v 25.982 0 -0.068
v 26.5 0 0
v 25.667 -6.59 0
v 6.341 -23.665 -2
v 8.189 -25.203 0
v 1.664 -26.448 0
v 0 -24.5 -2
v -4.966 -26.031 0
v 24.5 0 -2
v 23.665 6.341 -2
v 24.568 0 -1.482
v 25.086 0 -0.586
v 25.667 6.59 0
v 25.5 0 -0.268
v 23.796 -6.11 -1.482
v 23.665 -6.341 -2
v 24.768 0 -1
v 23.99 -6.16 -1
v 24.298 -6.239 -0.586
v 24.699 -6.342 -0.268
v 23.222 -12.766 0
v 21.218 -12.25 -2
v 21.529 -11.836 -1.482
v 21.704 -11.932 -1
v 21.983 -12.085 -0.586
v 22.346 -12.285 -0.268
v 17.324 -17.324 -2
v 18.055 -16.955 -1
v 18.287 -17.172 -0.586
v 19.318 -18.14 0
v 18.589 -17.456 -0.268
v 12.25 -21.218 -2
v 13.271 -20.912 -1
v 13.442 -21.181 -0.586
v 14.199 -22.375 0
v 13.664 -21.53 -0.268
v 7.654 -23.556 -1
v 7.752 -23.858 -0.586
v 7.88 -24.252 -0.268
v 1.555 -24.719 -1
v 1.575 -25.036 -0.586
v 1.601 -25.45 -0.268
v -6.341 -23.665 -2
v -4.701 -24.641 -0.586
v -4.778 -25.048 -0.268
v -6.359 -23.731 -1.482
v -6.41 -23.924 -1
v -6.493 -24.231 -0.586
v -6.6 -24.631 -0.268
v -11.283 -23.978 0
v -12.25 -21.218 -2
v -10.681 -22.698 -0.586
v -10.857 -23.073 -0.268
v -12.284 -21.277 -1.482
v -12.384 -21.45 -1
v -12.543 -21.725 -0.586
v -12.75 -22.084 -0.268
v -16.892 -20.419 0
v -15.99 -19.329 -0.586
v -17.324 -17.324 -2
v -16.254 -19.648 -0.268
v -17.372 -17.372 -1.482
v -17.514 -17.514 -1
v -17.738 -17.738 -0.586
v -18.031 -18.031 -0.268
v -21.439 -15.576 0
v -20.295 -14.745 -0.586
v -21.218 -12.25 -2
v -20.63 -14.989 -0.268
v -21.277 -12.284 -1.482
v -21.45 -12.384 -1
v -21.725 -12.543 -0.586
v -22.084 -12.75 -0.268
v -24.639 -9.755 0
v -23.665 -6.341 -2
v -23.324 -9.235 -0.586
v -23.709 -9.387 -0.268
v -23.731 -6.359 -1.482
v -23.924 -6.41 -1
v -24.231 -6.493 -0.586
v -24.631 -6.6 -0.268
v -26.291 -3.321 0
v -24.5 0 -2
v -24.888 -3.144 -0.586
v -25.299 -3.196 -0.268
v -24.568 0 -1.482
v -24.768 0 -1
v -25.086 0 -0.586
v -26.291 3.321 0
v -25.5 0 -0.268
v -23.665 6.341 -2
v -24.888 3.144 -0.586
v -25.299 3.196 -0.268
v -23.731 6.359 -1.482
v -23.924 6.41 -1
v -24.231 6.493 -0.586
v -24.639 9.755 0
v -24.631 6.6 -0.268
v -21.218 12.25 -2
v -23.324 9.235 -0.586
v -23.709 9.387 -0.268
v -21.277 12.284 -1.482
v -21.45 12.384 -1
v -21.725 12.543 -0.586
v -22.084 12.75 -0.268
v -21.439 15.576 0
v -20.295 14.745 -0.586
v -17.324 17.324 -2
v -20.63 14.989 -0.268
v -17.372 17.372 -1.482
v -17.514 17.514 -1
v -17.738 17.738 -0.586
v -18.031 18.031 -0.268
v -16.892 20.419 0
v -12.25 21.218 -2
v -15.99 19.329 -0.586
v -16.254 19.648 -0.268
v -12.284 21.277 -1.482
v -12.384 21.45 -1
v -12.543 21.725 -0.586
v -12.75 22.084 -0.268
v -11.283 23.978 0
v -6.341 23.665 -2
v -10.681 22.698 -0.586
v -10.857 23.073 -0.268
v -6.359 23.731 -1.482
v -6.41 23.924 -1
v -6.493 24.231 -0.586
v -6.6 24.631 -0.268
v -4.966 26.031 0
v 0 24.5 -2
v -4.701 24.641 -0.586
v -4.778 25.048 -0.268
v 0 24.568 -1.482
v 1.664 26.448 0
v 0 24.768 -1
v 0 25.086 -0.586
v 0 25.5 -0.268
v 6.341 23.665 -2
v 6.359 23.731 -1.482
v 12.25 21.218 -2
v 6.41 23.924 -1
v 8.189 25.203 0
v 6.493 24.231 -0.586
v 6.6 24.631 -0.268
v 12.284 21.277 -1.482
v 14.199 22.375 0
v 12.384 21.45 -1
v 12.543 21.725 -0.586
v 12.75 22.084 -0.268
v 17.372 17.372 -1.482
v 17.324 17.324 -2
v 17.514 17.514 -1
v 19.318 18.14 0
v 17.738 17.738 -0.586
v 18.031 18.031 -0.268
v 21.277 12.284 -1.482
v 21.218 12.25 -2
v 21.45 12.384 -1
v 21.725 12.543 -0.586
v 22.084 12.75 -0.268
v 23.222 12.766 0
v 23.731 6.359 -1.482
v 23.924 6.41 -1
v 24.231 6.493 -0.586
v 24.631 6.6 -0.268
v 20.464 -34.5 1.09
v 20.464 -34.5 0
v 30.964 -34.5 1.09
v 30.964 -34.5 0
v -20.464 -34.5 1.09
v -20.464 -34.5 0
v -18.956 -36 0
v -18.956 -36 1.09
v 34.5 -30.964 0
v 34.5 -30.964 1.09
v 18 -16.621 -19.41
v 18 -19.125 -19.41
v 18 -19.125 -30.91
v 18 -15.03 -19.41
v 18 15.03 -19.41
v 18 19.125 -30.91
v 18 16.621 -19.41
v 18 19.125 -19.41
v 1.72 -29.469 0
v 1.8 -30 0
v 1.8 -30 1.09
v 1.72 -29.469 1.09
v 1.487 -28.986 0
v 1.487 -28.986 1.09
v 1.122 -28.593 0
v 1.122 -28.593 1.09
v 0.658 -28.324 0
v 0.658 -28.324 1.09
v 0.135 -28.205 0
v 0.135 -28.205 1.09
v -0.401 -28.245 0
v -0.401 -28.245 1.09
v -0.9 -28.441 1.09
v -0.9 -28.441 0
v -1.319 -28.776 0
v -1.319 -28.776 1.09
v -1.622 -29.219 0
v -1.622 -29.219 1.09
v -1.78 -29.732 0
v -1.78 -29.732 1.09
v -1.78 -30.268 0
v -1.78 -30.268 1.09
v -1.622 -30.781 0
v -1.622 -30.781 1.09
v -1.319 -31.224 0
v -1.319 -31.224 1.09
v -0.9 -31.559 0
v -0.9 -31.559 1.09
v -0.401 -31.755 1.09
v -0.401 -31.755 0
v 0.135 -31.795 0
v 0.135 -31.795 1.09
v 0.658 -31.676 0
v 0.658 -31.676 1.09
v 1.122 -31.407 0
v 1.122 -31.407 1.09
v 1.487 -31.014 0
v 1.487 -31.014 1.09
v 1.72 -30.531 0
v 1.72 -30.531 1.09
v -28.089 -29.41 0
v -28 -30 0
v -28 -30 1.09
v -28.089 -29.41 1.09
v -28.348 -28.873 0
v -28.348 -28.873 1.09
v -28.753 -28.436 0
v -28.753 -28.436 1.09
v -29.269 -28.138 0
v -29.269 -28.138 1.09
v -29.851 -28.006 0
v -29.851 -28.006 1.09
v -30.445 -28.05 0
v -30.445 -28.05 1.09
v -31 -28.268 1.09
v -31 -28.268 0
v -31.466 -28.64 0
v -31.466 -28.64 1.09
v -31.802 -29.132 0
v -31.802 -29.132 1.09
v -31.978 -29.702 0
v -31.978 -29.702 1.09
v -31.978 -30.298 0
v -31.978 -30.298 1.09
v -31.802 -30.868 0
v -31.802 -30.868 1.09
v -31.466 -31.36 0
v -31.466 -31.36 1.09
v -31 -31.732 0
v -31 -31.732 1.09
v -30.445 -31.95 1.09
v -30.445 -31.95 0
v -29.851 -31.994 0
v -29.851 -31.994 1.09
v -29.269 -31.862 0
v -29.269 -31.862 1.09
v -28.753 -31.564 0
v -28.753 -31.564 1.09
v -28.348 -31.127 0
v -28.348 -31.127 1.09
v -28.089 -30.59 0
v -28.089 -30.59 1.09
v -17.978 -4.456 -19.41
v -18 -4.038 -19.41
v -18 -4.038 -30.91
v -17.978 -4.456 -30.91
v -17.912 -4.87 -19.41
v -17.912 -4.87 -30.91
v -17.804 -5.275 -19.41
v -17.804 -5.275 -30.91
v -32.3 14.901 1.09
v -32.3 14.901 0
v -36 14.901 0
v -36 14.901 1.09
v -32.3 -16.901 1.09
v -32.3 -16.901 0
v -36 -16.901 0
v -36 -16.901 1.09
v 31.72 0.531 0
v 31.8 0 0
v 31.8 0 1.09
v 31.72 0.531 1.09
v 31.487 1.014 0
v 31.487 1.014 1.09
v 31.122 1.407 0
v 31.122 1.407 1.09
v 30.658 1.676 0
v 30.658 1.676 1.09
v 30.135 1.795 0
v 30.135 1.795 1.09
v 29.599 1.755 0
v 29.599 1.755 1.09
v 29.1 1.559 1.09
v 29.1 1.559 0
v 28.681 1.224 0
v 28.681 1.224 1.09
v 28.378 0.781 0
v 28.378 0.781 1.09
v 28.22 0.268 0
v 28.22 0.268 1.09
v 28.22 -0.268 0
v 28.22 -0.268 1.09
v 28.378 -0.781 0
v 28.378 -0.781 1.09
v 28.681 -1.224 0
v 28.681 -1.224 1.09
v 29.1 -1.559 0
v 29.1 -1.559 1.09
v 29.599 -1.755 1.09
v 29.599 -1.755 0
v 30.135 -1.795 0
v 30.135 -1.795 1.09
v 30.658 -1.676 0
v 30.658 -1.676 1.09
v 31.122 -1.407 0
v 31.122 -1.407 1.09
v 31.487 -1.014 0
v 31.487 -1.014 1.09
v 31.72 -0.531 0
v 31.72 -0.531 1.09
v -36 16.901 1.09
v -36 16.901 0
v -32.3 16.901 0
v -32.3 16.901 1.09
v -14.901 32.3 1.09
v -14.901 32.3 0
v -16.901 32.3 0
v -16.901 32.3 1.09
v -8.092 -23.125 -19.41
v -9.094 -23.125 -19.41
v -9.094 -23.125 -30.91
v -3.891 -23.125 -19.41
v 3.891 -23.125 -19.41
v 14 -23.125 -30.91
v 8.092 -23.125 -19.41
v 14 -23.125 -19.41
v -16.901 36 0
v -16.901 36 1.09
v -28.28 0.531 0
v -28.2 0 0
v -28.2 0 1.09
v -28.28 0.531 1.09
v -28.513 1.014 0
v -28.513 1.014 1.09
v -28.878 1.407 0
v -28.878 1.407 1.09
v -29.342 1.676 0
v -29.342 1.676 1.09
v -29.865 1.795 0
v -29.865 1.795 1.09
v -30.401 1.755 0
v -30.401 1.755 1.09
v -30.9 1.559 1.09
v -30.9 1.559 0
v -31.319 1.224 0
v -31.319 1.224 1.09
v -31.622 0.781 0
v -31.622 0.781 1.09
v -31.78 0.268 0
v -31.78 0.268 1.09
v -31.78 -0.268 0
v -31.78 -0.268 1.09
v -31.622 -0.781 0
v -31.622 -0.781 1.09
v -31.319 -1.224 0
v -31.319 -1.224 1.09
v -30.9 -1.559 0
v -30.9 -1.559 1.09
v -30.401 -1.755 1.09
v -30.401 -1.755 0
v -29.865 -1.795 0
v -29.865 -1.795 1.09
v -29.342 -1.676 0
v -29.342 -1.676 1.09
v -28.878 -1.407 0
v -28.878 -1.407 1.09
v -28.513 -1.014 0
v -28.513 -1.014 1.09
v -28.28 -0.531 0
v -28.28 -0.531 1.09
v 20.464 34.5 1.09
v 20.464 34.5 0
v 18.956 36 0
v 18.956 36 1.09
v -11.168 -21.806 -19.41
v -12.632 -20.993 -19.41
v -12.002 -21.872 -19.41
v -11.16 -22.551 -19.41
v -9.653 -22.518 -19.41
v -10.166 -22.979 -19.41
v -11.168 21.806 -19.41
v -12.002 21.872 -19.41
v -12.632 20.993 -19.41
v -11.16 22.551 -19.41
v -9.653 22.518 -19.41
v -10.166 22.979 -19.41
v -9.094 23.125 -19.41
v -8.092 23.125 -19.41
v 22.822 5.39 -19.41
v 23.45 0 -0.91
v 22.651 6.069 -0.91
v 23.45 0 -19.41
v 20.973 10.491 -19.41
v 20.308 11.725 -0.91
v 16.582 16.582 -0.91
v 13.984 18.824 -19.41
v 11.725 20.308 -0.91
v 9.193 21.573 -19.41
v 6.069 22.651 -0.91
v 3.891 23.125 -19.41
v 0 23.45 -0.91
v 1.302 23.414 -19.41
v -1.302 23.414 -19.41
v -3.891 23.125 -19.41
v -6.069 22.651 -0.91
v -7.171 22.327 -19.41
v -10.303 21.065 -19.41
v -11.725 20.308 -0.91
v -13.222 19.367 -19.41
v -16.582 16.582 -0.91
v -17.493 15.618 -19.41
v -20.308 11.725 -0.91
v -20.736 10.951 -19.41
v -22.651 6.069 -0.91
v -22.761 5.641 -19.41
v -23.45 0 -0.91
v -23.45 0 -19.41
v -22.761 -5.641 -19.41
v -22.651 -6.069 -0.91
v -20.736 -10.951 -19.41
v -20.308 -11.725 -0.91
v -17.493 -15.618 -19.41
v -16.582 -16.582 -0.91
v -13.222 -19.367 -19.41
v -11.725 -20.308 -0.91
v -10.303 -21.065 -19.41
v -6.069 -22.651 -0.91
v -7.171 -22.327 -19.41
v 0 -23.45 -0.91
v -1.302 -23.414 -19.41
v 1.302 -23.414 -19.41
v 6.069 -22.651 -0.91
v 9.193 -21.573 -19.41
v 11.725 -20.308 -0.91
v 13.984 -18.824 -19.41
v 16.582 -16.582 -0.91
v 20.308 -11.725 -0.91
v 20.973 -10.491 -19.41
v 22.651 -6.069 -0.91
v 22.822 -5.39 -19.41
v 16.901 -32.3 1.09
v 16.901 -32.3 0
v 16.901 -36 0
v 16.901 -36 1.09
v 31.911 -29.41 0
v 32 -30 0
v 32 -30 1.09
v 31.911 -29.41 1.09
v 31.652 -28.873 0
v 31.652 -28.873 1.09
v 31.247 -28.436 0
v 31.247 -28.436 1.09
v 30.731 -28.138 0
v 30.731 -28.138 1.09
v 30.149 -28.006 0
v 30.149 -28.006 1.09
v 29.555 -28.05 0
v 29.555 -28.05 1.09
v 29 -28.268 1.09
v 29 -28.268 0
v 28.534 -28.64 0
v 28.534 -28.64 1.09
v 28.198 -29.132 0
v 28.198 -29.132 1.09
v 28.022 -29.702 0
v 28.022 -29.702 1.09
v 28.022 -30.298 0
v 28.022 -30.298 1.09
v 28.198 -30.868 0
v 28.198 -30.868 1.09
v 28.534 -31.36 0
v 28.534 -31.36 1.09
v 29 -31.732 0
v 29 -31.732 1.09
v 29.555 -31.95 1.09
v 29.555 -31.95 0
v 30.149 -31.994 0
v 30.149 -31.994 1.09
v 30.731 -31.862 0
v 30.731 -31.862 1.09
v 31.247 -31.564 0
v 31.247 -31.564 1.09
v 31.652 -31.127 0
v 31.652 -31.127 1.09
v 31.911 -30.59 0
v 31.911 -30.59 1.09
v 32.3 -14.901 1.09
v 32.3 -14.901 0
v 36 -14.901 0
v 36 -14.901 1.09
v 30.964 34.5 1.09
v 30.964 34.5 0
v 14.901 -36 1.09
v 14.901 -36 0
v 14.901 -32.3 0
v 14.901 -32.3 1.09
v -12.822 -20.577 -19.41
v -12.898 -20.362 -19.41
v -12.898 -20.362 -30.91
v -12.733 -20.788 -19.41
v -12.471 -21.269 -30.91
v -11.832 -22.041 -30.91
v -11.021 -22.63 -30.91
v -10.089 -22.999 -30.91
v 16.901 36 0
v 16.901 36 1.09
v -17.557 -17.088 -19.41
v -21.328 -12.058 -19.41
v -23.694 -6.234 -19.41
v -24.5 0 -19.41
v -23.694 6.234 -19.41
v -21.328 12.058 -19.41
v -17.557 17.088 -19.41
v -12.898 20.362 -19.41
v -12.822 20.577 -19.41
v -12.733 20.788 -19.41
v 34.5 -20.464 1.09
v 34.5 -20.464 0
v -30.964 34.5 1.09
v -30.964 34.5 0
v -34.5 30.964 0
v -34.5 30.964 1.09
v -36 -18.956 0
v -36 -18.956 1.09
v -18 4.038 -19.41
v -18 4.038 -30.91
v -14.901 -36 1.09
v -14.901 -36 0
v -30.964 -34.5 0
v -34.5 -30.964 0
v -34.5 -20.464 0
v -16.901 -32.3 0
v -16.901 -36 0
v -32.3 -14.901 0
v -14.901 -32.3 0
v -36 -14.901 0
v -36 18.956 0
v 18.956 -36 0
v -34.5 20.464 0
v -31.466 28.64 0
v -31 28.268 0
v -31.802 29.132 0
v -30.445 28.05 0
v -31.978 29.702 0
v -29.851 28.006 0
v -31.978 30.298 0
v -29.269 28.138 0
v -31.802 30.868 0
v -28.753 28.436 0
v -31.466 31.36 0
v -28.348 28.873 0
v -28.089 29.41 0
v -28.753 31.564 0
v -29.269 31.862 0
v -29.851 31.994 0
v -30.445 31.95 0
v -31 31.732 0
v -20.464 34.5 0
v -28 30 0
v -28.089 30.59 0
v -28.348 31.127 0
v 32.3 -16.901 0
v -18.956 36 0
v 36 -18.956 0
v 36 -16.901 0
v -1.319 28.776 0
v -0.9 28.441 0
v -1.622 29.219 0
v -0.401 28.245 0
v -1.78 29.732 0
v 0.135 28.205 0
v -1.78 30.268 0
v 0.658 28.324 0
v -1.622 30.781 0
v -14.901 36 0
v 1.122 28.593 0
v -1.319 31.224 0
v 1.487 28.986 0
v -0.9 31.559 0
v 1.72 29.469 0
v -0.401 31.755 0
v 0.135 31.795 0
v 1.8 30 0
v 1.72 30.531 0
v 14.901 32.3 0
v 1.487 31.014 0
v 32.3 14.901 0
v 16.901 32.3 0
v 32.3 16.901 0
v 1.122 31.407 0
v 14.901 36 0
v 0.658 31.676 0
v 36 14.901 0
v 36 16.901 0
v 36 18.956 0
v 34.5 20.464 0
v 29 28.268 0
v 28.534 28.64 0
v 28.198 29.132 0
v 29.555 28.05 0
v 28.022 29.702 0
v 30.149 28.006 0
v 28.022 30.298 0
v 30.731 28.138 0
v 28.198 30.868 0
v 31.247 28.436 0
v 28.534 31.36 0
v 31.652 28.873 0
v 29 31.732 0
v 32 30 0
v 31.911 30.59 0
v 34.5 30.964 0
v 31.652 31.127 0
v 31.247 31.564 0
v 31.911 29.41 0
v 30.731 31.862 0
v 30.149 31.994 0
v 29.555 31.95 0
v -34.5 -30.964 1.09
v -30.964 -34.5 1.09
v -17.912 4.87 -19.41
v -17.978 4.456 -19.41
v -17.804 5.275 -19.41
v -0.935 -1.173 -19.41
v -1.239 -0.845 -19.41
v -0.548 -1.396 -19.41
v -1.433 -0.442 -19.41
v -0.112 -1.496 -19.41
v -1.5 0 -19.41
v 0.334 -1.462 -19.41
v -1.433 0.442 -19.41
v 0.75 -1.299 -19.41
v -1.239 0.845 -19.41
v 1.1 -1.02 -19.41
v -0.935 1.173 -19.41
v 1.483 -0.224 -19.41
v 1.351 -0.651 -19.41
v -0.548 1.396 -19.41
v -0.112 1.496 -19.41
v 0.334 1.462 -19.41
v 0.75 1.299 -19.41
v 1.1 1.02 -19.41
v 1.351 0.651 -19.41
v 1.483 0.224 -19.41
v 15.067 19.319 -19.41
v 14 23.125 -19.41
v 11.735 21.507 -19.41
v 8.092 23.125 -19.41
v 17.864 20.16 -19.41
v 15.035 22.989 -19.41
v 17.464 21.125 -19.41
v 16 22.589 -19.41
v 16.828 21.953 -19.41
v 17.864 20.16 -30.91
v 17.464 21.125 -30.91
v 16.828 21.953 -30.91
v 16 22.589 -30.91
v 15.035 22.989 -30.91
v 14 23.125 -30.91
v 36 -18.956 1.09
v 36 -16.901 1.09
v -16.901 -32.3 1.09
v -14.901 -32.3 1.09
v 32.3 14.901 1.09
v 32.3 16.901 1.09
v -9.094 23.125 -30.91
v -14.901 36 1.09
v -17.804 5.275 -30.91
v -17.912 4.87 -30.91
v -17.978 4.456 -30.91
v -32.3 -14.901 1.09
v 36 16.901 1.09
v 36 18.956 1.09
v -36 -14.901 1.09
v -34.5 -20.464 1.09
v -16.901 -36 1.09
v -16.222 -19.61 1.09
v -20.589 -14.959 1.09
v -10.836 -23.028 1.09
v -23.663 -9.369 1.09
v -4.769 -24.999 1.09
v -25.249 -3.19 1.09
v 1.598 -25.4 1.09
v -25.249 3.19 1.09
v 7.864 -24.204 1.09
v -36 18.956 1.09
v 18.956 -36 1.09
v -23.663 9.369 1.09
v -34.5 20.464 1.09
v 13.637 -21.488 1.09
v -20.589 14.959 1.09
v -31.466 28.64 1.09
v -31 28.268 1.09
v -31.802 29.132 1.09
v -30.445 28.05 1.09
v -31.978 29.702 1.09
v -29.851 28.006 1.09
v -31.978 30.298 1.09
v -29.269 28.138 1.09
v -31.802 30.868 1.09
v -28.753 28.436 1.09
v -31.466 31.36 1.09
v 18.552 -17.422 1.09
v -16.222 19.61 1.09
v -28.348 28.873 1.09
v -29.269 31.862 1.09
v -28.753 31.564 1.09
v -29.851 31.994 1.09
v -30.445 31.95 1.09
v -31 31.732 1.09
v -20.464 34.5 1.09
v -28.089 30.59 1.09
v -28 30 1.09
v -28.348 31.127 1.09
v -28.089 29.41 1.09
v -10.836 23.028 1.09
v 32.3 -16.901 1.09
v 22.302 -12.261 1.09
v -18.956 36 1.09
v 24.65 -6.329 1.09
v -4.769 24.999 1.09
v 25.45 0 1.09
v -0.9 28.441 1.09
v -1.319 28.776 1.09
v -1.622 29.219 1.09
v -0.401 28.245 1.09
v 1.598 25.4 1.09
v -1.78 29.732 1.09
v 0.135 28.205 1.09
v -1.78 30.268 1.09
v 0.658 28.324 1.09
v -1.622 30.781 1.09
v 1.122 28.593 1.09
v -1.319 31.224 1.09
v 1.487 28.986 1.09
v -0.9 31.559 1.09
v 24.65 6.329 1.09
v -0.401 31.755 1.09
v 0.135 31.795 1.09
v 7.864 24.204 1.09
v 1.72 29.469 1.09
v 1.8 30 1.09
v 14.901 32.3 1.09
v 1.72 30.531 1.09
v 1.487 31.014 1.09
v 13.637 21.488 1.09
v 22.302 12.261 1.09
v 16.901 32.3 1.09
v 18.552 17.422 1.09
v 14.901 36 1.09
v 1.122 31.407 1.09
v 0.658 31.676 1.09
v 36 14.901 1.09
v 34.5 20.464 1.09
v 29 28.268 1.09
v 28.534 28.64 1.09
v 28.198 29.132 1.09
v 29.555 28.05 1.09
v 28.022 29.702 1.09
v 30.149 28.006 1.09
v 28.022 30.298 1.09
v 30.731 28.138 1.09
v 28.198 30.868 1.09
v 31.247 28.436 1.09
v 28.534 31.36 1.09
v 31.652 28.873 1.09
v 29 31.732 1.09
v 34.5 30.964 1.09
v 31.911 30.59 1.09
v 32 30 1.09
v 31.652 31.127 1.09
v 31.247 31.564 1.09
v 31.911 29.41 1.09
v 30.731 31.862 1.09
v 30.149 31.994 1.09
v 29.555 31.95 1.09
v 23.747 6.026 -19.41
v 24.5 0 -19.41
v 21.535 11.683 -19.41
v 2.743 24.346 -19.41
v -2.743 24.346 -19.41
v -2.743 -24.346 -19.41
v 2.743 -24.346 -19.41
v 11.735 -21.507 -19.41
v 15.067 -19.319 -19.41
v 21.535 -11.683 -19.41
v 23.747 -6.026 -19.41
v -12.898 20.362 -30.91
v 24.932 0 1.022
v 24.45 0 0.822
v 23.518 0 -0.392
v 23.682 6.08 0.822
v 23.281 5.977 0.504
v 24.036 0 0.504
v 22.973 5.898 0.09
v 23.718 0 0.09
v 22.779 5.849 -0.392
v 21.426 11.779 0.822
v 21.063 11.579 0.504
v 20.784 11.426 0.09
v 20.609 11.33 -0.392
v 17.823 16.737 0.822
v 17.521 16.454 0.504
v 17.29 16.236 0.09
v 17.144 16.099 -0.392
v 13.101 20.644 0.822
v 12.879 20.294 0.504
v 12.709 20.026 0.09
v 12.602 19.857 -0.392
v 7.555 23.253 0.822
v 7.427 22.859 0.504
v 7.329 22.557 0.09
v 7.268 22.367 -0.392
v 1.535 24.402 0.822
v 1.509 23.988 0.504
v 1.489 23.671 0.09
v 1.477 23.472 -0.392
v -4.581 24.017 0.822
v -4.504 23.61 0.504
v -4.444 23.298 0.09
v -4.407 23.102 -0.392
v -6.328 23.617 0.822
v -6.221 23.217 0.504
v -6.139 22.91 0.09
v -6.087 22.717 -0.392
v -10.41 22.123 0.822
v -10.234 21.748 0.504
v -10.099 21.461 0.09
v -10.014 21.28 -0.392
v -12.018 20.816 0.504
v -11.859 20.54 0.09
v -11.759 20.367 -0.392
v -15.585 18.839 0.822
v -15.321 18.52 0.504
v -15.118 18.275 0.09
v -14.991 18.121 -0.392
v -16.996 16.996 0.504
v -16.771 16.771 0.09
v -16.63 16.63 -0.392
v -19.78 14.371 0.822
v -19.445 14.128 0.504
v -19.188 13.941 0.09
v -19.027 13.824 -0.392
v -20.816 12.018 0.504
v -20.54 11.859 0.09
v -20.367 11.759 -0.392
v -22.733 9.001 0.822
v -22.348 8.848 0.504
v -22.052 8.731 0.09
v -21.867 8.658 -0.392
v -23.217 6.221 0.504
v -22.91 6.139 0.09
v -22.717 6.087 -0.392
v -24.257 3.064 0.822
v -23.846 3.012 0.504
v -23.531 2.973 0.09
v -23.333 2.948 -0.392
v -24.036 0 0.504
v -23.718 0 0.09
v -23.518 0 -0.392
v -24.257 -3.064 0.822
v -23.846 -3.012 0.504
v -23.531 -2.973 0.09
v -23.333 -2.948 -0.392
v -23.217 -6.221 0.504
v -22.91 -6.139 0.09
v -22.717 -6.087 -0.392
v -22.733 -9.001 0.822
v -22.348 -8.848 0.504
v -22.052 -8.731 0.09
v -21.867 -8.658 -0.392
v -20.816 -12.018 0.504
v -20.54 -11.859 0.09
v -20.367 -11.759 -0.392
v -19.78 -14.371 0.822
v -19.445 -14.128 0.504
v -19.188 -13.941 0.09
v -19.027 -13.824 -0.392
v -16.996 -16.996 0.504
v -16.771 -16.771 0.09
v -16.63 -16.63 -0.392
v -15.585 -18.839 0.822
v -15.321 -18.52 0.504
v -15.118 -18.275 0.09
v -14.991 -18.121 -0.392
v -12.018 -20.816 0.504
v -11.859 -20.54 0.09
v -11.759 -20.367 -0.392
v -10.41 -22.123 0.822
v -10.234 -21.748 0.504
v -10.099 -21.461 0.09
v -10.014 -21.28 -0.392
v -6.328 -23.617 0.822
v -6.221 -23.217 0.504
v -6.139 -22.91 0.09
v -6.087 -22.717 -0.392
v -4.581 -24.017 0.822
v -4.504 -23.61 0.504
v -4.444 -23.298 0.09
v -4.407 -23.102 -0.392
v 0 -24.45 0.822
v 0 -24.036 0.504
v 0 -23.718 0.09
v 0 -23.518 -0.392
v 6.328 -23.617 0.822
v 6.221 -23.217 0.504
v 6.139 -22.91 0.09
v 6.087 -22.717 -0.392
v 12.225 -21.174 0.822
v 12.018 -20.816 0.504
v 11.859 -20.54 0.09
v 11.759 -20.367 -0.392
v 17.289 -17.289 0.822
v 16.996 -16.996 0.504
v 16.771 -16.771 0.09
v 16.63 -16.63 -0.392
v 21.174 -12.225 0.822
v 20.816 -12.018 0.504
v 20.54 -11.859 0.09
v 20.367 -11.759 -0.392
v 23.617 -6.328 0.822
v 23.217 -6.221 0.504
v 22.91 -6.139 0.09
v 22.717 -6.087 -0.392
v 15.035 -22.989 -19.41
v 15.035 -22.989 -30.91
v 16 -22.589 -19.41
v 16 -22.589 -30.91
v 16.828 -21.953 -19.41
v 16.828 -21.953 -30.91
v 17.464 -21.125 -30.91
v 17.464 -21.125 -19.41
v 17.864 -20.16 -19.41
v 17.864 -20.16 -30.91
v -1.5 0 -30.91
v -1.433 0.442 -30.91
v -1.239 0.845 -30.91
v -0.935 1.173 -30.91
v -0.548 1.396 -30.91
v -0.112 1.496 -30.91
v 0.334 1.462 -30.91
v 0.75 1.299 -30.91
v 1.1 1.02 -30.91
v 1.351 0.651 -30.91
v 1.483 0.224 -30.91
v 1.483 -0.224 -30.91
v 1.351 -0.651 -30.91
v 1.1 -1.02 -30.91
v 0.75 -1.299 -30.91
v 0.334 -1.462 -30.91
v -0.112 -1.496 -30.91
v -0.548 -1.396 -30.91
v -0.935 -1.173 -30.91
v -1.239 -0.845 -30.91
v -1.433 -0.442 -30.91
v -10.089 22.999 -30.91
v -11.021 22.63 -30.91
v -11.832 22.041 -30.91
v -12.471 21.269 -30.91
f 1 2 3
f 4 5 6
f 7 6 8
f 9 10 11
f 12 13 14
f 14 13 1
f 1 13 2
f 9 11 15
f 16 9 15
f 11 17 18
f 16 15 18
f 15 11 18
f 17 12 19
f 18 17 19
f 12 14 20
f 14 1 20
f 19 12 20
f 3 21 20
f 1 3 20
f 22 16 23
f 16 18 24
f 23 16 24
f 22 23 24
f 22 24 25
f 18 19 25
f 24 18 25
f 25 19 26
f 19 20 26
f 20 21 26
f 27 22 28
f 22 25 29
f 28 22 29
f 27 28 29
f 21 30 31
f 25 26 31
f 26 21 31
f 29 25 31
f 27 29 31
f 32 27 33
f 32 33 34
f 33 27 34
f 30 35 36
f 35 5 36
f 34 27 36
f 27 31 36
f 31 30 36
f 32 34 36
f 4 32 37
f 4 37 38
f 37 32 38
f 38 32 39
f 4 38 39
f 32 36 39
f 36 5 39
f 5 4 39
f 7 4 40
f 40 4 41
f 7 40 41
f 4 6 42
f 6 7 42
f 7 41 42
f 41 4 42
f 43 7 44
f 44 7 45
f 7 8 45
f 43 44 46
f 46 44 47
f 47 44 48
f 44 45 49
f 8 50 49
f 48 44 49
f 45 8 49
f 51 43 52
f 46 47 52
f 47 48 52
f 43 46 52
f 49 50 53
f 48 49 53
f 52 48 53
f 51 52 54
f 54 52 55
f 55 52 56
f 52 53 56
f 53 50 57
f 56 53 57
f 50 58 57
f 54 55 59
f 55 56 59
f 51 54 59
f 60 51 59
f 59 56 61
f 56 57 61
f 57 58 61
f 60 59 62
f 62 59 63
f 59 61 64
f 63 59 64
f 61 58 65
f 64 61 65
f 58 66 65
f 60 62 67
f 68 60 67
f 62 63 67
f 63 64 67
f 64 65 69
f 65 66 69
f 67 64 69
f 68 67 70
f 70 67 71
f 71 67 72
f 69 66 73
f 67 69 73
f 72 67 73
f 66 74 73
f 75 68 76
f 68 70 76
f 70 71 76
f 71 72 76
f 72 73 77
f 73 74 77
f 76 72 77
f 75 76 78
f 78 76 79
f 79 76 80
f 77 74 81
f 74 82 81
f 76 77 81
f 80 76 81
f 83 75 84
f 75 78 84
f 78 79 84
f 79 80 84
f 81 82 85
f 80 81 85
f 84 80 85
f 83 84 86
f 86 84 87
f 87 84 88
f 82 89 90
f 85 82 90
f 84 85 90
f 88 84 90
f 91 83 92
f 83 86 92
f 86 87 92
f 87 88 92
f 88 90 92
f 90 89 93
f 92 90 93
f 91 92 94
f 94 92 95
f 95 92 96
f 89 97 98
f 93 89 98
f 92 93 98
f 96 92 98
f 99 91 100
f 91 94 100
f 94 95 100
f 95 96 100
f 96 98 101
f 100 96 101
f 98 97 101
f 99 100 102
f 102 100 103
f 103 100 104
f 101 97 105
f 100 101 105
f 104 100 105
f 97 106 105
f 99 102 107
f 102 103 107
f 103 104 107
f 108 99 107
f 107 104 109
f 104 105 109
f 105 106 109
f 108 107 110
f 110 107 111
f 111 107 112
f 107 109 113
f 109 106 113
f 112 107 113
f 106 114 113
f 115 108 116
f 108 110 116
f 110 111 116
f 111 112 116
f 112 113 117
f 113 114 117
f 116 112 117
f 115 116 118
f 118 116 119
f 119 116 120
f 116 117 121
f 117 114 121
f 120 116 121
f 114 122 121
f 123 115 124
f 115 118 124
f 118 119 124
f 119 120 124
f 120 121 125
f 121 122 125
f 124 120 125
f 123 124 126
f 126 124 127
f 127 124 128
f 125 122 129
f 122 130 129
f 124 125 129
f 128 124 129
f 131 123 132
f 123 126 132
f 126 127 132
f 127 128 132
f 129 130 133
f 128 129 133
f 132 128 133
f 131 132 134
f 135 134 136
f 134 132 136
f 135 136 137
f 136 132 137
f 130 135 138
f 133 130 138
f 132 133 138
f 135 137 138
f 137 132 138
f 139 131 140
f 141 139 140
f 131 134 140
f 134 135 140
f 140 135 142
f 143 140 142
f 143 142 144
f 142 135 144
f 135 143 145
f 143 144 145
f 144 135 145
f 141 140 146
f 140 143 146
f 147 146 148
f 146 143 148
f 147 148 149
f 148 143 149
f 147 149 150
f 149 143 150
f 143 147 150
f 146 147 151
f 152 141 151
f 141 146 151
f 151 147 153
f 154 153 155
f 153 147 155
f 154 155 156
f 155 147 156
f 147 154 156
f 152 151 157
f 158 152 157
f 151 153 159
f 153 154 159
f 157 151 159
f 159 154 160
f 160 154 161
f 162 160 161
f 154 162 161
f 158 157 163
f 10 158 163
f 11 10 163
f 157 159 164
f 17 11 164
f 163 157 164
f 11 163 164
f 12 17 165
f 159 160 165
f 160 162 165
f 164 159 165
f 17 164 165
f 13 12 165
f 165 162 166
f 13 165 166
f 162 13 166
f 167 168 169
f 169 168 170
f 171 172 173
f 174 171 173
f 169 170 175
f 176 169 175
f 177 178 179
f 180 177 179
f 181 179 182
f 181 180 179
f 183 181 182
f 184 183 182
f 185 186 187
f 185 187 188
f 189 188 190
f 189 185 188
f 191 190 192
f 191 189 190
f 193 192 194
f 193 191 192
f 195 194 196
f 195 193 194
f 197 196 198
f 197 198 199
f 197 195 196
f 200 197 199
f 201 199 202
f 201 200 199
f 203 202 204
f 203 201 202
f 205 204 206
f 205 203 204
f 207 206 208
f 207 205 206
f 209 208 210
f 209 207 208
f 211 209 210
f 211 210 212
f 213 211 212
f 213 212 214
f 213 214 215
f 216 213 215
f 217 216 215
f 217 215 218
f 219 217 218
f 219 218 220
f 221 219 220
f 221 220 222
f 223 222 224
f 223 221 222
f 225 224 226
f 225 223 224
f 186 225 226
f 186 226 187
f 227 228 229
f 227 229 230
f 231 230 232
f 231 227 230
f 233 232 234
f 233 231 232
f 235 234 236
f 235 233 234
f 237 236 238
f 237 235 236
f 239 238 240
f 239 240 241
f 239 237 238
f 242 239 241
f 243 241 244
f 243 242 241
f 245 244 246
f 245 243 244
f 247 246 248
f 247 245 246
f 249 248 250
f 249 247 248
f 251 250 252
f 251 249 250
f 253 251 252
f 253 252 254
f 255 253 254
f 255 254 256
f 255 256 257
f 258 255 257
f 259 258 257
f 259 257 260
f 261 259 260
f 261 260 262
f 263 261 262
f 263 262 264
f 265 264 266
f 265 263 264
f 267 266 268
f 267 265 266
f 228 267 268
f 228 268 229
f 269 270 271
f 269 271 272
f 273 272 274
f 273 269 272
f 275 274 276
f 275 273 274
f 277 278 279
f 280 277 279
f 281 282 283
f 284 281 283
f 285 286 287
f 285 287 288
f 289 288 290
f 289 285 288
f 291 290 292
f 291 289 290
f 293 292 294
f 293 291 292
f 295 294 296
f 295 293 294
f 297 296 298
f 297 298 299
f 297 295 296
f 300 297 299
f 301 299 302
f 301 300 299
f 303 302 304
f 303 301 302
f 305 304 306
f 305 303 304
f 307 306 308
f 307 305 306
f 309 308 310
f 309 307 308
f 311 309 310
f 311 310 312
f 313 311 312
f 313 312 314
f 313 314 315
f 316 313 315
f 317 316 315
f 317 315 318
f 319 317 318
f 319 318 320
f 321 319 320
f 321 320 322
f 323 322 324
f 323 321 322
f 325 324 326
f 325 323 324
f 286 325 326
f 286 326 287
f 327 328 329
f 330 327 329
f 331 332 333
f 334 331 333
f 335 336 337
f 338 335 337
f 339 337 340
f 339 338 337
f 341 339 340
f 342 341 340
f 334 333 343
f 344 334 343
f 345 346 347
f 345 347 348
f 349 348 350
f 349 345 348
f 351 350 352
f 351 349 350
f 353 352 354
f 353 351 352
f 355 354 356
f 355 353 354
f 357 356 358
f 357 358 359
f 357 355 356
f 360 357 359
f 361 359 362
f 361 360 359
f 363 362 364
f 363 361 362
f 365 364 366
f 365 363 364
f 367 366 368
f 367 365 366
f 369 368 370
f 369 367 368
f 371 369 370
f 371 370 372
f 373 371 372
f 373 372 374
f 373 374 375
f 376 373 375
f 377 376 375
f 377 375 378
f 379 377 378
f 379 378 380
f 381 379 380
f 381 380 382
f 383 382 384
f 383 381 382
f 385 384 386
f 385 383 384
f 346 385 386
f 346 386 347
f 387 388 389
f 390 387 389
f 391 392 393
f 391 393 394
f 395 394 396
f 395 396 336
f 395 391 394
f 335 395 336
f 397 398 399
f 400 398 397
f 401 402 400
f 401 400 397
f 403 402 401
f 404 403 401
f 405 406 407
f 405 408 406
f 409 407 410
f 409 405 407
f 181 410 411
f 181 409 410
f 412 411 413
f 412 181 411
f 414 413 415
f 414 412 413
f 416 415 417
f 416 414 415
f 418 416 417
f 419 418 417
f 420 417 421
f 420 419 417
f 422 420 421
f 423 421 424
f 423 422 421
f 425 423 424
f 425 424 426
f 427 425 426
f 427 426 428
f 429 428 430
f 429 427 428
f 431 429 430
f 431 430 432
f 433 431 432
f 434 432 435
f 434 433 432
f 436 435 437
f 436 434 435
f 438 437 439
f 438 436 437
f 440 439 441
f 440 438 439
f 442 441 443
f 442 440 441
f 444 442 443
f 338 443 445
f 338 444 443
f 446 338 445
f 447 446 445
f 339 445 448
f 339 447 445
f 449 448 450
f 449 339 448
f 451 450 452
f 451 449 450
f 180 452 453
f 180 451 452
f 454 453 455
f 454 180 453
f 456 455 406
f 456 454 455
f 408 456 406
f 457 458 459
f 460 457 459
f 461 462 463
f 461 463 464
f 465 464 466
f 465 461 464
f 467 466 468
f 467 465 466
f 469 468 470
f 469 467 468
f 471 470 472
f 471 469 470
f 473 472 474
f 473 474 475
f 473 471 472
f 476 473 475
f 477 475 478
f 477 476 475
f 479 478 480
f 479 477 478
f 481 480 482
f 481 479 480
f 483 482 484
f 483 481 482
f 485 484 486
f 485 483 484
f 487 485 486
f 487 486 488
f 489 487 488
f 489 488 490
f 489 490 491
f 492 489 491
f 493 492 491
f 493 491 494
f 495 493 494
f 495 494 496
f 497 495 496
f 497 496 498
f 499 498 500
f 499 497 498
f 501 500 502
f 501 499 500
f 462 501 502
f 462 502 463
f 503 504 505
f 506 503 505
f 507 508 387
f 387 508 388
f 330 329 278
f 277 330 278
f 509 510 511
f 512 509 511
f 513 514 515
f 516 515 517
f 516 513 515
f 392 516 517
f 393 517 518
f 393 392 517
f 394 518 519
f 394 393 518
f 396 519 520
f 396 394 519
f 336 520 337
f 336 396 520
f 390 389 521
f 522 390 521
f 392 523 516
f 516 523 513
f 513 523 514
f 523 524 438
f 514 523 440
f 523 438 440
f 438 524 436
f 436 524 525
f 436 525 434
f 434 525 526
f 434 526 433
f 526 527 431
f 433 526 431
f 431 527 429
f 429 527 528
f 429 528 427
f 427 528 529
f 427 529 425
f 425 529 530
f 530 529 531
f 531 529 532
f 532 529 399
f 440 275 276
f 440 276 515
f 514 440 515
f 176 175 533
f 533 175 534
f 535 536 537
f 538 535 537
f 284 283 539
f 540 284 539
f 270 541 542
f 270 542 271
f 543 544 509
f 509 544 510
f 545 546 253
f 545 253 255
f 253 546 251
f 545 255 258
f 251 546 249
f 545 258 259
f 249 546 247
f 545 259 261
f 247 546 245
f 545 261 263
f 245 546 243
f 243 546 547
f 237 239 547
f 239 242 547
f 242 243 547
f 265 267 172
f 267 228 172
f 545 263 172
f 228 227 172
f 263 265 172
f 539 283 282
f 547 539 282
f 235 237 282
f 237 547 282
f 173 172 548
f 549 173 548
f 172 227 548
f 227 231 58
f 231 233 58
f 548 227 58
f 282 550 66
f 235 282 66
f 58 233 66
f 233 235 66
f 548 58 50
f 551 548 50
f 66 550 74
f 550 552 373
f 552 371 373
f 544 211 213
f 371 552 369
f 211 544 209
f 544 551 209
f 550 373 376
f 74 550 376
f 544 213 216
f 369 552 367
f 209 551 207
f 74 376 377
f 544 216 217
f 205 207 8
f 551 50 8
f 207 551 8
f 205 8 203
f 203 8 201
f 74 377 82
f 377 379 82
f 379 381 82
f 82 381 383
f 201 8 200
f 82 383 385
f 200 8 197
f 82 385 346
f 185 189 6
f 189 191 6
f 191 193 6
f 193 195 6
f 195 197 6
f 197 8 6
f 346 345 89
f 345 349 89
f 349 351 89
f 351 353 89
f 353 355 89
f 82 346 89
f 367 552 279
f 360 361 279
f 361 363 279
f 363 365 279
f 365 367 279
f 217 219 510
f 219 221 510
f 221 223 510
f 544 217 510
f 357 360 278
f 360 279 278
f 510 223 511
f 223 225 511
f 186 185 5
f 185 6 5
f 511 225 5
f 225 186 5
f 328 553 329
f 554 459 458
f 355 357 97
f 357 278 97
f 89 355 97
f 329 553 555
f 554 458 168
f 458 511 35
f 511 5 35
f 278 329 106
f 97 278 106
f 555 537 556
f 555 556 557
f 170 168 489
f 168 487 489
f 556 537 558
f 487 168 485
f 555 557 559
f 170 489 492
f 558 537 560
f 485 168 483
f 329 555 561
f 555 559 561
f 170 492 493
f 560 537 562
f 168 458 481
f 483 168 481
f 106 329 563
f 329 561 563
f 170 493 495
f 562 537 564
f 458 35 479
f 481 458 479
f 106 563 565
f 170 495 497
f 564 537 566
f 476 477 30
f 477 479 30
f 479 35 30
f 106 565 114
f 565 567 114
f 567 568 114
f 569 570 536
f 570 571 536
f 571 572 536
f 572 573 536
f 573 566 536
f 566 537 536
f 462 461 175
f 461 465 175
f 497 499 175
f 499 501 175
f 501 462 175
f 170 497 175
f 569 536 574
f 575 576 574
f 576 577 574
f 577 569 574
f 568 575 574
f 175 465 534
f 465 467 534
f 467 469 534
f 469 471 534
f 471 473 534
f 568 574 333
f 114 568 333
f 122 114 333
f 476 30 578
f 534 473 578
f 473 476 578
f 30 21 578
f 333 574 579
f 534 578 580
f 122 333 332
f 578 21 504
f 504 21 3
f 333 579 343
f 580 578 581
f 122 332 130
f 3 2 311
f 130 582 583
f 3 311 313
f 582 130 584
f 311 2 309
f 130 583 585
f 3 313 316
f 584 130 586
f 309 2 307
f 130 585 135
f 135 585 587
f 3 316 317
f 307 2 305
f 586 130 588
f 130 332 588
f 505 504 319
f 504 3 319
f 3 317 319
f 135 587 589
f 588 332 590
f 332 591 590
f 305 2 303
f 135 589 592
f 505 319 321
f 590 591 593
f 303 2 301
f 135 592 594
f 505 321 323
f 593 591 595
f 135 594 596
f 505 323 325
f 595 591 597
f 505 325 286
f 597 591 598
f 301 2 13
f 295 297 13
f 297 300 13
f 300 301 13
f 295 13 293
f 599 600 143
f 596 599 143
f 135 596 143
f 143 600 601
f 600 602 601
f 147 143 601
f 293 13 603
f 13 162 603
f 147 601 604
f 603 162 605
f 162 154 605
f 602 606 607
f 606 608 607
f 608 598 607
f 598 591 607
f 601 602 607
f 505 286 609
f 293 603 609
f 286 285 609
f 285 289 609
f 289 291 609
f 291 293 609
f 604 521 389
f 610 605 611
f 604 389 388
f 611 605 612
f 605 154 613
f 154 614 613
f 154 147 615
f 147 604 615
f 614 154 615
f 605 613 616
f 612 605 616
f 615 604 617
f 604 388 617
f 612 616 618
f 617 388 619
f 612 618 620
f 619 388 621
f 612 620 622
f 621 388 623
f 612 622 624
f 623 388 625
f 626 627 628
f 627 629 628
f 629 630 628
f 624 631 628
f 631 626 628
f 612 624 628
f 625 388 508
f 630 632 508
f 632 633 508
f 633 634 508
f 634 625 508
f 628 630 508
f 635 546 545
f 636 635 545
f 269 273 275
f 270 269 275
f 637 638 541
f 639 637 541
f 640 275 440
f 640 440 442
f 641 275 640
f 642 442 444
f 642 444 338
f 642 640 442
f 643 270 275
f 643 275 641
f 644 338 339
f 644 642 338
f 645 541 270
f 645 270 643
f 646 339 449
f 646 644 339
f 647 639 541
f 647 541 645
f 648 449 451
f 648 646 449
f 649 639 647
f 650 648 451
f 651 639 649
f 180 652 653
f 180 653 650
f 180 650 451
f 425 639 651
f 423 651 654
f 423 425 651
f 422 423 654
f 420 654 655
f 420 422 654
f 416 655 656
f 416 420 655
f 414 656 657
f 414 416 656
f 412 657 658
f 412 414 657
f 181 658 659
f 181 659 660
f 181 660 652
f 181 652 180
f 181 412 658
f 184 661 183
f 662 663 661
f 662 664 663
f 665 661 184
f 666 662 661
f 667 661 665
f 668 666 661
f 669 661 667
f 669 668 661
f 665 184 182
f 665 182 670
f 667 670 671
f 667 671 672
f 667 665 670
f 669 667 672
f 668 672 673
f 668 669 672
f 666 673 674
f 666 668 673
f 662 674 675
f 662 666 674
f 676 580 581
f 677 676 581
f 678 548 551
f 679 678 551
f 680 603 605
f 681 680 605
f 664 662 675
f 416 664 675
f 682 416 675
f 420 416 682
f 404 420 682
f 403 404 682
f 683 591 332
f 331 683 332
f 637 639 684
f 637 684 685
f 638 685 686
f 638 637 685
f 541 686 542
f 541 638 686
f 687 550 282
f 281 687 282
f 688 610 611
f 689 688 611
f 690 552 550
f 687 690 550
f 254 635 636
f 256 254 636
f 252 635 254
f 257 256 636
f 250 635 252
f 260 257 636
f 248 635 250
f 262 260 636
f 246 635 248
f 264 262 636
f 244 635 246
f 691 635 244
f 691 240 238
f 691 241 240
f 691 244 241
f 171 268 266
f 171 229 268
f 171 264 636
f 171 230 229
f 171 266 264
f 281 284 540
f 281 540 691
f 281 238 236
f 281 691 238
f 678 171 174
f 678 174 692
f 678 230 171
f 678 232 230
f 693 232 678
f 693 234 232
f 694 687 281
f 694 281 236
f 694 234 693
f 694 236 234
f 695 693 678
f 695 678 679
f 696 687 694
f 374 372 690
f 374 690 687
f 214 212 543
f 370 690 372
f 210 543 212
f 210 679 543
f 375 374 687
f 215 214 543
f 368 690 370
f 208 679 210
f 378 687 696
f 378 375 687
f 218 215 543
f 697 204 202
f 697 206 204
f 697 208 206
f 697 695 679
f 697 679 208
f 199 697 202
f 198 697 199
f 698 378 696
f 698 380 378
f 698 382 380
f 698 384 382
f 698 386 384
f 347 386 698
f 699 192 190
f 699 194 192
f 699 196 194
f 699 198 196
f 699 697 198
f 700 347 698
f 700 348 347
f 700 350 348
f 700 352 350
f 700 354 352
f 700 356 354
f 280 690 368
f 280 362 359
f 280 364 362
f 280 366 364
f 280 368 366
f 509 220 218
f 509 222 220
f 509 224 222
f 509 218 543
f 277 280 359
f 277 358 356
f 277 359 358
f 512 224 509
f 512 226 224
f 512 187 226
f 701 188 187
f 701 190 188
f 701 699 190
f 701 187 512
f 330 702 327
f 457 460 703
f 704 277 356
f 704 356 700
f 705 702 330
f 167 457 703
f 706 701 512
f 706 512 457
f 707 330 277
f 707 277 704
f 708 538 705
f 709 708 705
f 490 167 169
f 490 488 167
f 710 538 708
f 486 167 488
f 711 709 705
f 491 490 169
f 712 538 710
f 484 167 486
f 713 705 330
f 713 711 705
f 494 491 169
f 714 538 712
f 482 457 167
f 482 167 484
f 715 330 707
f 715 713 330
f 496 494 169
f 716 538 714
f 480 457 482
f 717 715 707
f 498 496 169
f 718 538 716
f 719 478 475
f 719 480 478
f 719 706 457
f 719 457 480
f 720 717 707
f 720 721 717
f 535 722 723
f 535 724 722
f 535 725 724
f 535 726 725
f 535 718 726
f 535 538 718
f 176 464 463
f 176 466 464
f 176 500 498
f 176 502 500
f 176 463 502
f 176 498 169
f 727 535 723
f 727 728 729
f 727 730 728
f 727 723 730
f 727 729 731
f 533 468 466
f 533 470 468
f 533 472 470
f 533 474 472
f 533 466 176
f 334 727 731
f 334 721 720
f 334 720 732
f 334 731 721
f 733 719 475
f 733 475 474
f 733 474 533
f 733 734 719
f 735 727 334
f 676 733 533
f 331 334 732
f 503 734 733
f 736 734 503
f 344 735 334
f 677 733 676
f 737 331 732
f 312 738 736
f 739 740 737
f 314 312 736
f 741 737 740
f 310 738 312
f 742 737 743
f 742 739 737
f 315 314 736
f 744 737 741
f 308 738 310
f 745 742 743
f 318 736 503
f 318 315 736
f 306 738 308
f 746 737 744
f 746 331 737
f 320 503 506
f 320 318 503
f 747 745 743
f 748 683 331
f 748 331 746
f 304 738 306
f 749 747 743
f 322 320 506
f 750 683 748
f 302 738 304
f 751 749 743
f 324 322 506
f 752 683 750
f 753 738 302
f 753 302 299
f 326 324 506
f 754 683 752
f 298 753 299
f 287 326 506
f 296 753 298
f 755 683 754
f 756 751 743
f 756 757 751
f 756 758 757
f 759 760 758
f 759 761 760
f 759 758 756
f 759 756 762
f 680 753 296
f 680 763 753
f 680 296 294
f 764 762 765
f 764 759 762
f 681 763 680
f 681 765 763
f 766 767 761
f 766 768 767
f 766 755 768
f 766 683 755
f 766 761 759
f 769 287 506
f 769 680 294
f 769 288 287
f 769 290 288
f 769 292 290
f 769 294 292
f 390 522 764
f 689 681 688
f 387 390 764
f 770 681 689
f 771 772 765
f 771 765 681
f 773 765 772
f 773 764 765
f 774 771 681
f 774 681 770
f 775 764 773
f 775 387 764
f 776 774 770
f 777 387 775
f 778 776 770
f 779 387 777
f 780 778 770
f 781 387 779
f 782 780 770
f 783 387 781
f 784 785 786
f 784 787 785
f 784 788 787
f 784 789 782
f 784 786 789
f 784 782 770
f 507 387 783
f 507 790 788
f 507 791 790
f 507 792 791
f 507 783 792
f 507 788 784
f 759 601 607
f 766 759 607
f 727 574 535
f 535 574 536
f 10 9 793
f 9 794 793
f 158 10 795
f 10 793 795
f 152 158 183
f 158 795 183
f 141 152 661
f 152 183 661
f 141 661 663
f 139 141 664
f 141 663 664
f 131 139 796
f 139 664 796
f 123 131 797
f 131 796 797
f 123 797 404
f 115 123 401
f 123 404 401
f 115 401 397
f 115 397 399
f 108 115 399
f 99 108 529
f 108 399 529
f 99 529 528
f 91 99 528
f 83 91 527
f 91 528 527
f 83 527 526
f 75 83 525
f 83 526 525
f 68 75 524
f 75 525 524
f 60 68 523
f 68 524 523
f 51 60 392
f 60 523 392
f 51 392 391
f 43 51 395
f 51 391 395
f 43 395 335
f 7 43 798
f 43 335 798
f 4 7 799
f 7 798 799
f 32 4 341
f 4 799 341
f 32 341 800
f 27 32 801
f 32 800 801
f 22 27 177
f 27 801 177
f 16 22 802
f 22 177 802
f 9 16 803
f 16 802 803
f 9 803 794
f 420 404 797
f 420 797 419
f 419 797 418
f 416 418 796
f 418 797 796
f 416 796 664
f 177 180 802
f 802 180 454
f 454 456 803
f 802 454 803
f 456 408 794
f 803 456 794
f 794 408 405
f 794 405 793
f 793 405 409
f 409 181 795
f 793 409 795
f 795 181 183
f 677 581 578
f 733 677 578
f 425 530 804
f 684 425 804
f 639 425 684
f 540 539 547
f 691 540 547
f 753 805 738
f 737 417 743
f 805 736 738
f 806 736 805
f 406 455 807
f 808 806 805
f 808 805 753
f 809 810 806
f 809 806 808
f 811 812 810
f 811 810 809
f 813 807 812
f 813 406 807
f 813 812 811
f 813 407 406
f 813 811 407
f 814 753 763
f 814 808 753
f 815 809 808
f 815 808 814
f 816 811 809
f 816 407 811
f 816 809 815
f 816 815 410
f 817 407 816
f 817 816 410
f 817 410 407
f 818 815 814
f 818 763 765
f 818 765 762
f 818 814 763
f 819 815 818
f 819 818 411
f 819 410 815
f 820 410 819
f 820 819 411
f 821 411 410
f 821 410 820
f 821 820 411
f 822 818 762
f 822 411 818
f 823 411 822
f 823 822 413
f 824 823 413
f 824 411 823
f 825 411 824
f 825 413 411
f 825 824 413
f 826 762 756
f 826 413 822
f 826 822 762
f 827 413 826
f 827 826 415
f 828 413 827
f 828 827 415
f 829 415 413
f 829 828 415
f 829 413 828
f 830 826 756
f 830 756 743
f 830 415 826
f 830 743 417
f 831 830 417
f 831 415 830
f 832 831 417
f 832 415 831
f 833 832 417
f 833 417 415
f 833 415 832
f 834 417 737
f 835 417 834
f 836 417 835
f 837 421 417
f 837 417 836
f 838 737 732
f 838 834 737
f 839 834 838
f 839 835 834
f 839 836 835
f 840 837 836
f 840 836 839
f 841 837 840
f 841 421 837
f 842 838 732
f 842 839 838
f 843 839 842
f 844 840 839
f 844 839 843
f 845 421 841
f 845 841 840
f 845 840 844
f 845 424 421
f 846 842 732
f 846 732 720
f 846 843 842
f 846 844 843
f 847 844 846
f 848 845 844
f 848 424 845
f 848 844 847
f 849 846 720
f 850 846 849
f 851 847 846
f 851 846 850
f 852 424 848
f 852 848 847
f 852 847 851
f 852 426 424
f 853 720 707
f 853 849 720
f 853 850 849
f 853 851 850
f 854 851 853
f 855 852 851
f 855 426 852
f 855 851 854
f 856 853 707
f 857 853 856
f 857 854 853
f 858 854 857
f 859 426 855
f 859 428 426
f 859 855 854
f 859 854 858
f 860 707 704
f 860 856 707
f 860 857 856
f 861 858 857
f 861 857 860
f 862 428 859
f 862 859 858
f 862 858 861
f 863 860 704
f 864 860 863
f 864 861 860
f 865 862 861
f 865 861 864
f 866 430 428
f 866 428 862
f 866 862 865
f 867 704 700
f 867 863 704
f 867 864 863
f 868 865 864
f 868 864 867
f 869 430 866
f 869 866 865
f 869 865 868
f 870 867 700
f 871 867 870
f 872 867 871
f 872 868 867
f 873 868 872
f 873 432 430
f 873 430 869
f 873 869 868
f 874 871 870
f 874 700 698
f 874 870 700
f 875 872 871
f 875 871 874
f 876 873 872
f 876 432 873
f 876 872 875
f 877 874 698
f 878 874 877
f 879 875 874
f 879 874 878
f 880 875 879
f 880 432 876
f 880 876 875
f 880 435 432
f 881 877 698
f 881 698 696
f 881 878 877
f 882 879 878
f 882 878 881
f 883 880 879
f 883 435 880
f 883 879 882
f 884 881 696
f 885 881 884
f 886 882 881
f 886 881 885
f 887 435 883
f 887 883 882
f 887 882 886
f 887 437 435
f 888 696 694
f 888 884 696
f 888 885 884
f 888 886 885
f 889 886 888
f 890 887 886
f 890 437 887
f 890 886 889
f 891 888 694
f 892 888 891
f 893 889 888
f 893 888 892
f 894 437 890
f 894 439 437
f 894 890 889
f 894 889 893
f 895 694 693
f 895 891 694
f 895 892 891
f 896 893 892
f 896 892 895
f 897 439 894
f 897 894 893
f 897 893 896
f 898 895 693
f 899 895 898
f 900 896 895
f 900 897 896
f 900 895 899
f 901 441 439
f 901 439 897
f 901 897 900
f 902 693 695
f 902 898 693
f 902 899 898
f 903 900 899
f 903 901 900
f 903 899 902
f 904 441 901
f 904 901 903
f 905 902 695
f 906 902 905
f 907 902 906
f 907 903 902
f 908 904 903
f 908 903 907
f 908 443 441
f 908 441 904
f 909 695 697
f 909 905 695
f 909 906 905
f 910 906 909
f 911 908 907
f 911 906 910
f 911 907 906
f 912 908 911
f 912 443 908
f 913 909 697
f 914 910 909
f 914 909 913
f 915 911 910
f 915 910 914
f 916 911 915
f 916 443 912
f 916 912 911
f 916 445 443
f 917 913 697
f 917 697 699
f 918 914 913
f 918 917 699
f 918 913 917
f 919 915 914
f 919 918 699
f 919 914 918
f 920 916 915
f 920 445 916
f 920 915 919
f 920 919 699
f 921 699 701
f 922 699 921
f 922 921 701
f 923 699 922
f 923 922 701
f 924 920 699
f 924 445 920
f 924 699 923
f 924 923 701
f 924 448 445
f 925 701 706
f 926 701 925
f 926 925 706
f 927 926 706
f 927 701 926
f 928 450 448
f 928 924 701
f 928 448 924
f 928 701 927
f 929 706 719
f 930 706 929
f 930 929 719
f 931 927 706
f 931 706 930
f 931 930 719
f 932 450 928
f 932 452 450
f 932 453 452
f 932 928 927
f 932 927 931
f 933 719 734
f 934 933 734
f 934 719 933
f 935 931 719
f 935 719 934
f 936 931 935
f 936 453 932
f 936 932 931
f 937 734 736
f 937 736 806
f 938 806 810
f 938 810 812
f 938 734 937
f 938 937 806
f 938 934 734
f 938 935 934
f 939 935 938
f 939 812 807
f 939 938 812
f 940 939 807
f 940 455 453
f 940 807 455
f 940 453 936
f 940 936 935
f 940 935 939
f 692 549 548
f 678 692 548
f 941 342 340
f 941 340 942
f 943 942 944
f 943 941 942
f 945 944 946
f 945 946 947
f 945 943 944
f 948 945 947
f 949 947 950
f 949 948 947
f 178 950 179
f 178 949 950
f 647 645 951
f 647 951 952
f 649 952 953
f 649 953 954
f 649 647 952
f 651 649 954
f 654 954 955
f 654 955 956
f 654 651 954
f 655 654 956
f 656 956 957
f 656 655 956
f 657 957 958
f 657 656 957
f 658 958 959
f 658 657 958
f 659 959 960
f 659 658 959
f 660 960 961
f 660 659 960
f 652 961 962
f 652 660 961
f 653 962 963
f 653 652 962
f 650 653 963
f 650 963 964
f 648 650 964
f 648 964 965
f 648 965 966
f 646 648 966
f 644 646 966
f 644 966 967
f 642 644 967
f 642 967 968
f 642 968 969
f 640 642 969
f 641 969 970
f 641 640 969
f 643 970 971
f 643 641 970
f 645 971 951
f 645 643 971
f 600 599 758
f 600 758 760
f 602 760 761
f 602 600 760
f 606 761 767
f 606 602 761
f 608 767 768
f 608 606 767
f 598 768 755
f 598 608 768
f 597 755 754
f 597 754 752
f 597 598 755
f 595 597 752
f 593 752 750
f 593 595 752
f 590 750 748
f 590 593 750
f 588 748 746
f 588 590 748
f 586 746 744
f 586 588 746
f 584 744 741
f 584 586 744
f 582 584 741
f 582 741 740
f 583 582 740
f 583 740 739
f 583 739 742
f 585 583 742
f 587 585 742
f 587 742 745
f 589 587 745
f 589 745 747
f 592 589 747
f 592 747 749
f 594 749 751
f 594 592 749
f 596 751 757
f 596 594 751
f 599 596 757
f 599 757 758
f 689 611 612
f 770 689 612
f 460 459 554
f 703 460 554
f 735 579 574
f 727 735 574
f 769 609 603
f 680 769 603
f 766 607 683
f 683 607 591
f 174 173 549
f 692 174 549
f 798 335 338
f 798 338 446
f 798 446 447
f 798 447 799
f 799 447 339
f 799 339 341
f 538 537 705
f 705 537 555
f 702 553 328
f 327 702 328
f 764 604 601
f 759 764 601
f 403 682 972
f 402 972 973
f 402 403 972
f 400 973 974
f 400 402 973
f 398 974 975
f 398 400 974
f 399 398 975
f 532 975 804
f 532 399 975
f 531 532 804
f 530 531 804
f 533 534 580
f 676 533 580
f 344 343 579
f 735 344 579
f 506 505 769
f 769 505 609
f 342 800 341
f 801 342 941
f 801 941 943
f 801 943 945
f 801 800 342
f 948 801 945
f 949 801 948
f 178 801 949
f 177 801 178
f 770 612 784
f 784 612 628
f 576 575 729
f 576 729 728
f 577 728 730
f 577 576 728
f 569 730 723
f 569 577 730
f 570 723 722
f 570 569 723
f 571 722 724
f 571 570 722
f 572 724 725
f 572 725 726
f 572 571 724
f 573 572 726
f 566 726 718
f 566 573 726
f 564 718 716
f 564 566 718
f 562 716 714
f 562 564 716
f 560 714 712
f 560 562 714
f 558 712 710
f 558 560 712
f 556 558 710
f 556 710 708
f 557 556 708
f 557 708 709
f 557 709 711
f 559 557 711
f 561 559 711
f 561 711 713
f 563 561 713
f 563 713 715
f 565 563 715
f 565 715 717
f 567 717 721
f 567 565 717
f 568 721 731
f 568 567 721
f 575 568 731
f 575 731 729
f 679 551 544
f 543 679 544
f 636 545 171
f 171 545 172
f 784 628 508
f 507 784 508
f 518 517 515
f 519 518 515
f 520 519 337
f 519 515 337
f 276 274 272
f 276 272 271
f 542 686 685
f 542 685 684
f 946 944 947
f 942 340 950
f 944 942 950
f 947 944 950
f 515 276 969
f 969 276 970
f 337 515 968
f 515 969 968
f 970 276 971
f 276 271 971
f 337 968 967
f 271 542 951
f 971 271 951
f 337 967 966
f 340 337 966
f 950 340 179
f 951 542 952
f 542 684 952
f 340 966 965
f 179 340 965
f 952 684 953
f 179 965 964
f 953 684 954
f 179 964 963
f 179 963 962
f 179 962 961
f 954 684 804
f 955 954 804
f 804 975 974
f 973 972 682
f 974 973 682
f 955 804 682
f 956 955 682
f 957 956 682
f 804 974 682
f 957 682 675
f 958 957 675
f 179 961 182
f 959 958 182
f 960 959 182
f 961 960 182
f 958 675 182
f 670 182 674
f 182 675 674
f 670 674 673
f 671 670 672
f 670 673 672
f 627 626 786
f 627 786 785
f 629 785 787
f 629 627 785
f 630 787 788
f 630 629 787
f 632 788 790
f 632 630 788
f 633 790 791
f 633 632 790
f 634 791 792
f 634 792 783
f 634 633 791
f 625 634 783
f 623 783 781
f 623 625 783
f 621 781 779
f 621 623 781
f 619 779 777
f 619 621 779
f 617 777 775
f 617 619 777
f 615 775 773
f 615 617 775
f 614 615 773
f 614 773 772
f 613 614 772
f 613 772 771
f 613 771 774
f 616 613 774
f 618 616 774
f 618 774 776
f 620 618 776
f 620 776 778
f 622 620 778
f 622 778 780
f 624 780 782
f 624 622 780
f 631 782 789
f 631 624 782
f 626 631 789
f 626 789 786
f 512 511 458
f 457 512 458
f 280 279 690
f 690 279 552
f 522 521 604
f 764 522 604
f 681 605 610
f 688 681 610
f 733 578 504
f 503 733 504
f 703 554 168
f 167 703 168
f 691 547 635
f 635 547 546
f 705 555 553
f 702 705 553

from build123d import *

# Parameters (mm, degrees)
SKETCH_1_R      = 2
SKETCH_1_R_2    = 1.8
SKETCH_1_R_3    = 23.45
EXTRUDE_1_DEPTH = 1.09
EXTRUDE_START   = -20.5
SKETCH_2_R      = 24.5
SKETCH_2_R_2    = 23.45
EXTRUDE_2_DEPTH = 20.5
FILLET_1_R      = 2
SKETCH_3_R      = 1.5
EXTRUDE_3_DEPTH = 11.5


with BuildPart() as part:
    # Эскиз1 → Бобышка-Вытянуть1 (new body)
    with BuildSketch(Plane.XY):
        Polygon((-30.964466094, 34.5), (-34.5, 30.964466094), (-34.5, 20.464466094), (-36, 18.956328052), (-36, 16.901005102), (-32.3, 16.901005102), (-32.3, 14.901005102), (-36, 14.901005102), (-36, -14.901005102), (-32.3, -14.901005102), (-32.3, -16.901005102), (-36, -16.901005102), (-36, -18.956328052), (-34.5, -20.464466094), (-34.5, -30.964466094), (-30.964466094, -34.5), (-20.464466094, -34.5), (-18.956328052, -36), (-16.901005102, -36), (-16.901005102, -32.3), (-14.901005102, -32.3), (-14.901005102, -36), (14.901005102, -36), (14.901005102, -32.3), (16.901005102, -32.3), (16.901005102, -36), (18.956328052, -36), (20.464466094, -34.5), (30.964466094, -34.5), (34.5, -30.964466094), (34.5, -20.464466094), (36, -18.956328052), (36, -16.901005102), (32.3, -16.901005102), (32.3, -14.901005102), (36, -14.901005102), (36, 14.901005102), (32.3, 14.901005102), (32.3, 16.901005102), (36, 16.901005102), (36, 18.956328052), (34.5, 20.464466094), (34.5, 30.964466094), (30.964466094, 34.5), (20.464466094, 34.5), (18.956328052, 36), (16.901005102, 36), (16.901005102, 32.3), (14.901005102, 32.3), (14.901005102, 36), (-14.901005102, 36), (-14.901005102, 32.3), (-16.901005102, 32.3), (-16.901005102, 36), (-18.956328052, 36), (-20.464466094, 34.5), align=None)
        with Locations((-30, 30)):
            Circle(SKETCH_1_R, mode=Mode.SUBTRACT)
        with Locations((-30, 0)):
            Circle(SKETCH_1_R_2, mode=Mode.SUBTRACT)
        with Locations((30, 30)):
            Circle(SKETCH_1_R, mode=Mode.SUBTRACT)
        with Locations((0, 30)):
            Circle(SKETCH_1_R_2, mode=Mode.SUBTRACT)
        with Locations((30, -30)):
            Circle(SKETCH_1_R, mode=Mode.SUBTRACT)
        with Locations((30, 0)):
            Circle(SKETCH_1_R_2, mode=Mode.SUBTRACT)
        with Locations((-30, -30)):
            Circle(SKETCH_1_R, mode=Mode.SUBTRACT)
        with Locations((0, -30)):
            Circle(SKETCH_1_R_2, mode=Mode.SUBTRACT)
        Circle(SKETCH_1_R_3, mode=Mode.SUBTRACT)
    extrude(amount=EXTRUDE_1_DEPTH)

    # Эскиз2 → Бобышка-Вытянуть2 (add)
    with BuildSketch(Plane.XY.offset(1.09).offset(EXTRUDE_START)):
        Circle(SKETCH_2_R)
        Circle(SKETCH_2_R_2, mode=Mode.SUBTRACT)
    extrude(amount=EXTRUDE_2_DEPTH)

    # Скругление1
    fillet_1_edges = [part.edges().sort_by_distance(p)[0] for p in [
        (-23.45, 0, 1.09),
        (-24.5, 0, 0),
    ]]
    fillet(fillet_1_edges, radius=FILLET_1_R)

    # Эскиз3 → Бобышка-Вытянуть3 (add)
    with BuildSketch(Plane(origin=(0, 0, -19.41), x_dir=(-1, 0, 0), z_dir=(0, 0, -1))):
        with BuildLine():
            Line((-18, -19.125), (-18, 19.125))
            ThreePointArc((-18, 19.125), (-16.828427125, 21.953427125), (-14, 23.125))
            Line((-14, 23.125), (9.094464209, 23.125))
            ThreePointArc((9.094464209, 23.125), (11.445269302, 22.361312008), (12.898433585, 20.361857708))
            Line((12.898433585, 20.361857708), (17.803969376, 5.274828861))
            ThreePointArc((17.803969376, 5.274828861), (17.95068839, 4.664119098), (18, 4.037971153))
            Line((18, 4.037971153), (18, -4.037971153))
            ThreePointArc((18, -4.037971153), (17.95068839, -4.664119098), (17.803969376, -5.274828861))
            Line((17.803969376, -5.274828861), (12.898433585, -20.361857708))
            ThreePointArc((12.898433585, -20.361857708), (11.445269302, -22.361312008), (9.094464209, -23.125))
            Line((9.094464209, -23.125), (-14, -23.125))
            ThreePointArc((-14, -23.125), (-16.828427125, -21.953427125), (-18, -19.125))
        make_face()
        Circle(SKETCH_3_R, mode=Mode.SUBTRACT)
    extrude(amount=EXTRUDE_3_DEPTH)


solid = part.part
